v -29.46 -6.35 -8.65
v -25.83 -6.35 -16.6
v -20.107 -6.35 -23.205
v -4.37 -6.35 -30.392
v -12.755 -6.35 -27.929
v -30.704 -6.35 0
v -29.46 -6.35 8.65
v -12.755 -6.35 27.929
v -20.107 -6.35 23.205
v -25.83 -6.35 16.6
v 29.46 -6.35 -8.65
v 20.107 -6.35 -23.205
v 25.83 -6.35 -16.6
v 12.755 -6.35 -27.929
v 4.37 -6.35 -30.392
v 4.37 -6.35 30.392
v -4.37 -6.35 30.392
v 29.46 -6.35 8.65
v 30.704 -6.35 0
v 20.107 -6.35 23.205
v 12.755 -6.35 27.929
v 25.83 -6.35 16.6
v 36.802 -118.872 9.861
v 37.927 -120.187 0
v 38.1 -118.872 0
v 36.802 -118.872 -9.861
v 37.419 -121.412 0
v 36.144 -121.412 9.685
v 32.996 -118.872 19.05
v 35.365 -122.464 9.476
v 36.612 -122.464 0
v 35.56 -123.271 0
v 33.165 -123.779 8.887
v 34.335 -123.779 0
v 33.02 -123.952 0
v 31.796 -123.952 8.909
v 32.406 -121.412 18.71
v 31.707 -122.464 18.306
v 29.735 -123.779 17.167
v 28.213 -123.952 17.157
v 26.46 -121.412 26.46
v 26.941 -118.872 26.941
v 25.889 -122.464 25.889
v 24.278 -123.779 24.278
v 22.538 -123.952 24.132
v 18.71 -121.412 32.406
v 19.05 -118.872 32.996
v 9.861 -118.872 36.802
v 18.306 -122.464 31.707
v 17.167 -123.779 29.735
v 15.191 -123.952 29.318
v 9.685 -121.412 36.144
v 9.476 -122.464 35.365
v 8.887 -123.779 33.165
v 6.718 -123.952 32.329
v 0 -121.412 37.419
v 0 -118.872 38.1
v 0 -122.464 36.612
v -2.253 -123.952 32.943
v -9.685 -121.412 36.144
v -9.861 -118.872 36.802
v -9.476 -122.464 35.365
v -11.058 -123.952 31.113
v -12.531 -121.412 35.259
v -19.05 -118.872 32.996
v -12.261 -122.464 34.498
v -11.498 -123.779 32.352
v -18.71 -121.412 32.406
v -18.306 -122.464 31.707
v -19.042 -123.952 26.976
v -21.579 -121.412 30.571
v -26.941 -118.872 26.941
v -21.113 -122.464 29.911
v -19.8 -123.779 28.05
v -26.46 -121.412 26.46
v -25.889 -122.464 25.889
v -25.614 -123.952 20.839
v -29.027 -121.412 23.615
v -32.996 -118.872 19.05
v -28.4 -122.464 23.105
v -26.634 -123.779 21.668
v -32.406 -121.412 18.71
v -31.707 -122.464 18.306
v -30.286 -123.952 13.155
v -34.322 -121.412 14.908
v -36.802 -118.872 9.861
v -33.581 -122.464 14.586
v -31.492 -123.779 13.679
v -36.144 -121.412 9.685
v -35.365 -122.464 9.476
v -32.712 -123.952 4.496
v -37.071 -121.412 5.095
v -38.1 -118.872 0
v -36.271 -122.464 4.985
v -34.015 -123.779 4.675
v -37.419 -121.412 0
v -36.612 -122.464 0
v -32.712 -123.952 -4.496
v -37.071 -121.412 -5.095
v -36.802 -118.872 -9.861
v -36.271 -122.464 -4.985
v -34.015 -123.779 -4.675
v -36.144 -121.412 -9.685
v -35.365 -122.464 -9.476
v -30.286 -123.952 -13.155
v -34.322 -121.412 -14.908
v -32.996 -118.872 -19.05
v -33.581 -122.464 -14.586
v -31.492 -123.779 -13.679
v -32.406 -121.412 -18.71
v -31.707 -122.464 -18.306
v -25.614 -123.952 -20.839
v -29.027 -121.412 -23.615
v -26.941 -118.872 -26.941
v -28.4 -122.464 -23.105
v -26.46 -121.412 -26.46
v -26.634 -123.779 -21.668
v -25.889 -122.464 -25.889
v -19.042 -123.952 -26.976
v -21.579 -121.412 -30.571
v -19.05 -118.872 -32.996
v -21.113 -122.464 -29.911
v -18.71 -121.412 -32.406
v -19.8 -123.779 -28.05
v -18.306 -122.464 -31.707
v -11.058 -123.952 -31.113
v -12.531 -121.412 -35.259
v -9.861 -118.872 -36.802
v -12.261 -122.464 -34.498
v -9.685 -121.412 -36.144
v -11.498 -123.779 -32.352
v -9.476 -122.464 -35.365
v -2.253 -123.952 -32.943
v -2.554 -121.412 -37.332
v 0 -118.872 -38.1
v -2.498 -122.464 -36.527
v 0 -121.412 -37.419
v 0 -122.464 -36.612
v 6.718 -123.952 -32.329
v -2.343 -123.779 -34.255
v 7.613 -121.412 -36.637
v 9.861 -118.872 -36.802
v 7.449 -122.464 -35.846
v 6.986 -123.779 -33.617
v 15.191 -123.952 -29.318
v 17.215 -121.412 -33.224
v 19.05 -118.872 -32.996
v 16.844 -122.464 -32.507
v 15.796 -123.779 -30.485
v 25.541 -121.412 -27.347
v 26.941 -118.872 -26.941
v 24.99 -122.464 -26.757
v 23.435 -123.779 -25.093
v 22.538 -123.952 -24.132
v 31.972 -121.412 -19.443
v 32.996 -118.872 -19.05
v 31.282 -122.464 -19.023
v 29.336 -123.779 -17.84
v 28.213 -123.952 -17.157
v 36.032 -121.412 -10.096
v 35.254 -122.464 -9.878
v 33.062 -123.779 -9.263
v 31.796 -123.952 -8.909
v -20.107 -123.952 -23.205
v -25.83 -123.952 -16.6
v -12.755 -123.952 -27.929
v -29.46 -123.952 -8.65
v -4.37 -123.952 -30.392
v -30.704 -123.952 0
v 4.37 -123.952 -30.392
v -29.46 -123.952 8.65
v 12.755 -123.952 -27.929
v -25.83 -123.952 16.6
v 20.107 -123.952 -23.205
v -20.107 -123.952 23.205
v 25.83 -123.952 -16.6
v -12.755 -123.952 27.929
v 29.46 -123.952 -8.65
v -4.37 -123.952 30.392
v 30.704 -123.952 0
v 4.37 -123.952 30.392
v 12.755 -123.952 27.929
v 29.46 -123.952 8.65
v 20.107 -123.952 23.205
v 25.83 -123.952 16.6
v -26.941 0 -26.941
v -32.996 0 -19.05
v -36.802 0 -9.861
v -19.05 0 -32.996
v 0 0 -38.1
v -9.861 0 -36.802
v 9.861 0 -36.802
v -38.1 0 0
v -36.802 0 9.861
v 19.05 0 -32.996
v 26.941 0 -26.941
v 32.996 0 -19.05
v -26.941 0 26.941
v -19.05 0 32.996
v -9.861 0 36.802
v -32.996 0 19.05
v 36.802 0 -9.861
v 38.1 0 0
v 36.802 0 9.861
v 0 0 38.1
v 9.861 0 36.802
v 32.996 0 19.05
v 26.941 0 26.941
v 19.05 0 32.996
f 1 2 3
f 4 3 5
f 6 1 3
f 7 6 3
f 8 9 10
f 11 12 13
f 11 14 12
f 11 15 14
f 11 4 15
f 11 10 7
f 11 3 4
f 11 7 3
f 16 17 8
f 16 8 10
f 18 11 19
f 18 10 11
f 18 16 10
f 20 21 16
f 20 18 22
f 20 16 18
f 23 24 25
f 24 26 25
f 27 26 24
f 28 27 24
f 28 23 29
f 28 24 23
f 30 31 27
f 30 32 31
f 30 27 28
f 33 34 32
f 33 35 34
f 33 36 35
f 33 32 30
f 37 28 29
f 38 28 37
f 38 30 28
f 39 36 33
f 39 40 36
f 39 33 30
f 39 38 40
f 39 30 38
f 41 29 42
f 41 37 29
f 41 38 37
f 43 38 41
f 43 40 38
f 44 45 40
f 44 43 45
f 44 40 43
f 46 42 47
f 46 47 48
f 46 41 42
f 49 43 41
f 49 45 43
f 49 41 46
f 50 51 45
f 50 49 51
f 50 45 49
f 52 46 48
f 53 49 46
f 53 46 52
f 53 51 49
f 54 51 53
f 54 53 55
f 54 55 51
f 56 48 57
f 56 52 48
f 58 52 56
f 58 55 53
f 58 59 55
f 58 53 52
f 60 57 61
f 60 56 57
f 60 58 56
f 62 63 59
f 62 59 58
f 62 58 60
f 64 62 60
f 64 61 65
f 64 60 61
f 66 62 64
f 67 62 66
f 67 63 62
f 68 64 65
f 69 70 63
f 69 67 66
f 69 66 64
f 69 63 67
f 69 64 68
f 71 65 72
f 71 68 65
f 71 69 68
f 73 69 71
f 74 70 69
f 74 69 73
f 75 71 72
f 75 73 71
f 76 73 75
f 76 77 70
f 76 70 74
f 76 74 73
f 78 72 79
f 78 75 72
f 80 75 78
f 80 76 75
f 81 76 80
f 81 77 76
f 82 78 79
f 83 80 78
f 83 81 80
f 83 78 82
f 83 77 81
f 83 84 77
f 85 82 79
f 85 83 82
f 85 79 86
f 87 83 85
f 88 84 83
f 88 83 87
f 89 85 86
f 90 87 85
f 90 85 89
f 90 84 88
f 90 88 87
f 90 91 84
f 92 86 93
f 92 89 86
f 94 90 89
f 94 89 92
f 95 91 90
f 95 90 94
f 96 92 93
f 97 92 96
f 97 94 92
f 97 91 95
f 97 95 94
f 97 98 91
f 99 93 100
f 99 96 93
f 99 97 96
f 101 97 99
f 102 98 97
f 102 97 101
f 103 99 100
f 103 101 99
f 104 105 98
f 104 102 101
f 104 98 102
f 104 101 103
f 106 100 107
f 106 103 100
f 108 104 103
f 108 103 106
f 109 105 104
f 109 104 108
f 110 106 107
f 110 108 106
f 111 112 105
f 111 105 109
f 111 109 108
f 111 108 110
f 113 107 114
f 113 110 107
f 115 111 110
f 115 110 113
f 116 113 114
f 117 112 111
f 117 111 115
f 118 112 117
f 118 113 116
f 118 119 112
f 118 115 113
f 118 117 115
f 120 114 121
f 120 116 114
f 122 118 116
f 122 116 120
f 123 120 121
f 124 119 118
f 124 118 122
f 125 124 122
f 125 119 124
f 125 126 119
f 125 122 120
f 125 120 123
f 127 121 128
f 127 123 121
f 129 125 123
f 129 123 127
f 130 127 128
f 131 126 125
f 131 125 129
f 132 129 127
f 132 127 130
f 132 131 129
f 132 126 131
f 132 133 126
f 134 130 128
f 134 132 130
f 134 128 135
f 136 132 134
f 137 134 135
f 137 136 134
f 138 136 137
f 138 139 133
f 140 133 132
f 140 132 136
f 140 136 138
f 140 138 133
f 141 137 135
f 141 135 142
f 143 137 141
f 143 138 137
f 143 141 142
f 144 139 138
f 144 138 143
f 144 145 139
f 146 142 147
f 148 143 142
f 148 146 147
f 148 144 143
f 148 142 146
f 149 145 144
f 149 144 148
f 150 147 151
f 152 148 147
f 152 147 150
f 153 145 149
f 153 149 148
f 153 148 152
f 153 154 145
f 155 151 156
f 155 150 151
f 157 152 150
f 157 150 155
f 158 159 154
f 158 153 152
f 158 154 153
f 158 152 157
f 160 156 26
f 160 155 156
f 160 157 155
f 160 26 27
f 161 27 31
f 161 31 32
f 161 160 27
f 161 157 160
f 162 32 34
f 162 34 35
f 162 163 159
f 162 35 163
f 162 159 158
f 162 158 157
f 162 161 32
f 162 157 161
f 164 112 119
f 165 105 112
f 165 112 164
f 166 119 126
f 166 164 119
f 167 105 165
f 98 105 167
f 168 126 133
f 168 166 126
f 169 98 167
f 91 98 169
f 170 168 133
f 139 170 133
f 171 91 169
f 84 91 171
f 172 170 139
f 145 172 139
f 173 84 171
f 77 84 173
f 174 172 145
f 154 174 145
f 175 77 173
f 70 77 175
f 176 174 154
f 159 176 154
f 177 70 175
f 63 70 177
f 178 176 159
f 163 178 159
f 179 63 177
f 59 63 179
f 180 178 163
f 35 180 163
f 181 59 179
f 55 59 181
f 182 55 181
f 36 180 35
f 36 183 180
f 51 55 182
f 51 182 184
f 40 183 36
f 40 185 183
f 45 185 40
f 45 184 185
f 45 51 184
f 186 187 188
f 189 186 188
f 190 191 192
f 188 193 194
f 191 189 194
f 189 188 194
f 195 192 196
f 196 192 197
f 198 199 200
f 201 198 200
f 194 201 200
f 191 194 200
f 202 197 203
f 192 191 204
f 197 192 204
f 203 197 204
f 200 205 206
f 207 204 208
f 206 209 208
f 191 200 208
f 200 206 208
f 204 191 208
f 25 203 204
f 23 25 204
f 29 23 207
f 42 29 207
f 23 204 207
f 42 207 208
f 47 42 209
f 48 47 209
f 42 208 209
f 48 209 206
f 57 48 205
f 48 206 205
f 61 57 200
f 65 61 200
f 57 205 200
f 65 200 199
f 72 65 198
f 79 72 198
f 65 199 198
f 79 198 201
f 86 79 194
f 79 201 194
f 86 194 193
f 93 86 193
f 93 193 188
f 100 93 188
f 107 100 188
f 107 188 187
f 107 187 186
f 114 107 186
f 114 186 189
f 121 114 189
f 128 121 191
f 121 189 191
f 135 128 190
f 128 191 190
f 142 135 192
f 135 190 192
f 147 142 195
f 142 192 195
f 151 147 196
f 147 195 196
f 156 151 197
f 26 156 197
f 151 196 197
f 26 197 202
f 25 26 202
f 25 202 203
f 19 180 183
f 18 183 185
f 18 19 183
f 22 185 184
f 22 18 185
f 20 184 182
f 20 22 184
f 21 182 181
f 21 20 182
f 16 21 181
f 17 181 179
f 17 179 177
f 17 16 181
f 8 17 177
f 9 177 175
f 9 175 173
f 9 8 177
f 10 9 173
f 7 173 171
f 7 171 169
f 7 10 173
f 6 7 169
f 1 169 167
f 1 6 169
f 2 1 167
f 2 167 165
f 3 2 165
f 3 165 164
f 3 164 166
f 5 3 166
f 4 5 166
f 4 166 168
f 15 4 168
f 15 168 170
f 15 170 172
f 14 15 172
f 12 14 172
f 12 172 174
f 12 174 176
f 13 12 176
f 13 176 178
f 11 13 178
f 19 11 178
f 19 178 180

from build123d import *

# Parameters (mm, degrees)
F0_R     = 38.1
F0_R_2   = 30.704041
F1_DEPTH = 123.952
F2_R     = 5.08
F3_R     = 30.737392
F4_DEPTH = 6.35


with BuildPart() as f1:
    # F0 (on Front) → F1 (new body)
    with BuildSketch(Plane.XZ):
        Circle(F0_R)
        Circle(F0_R_2, mode=Mode.SUBTRACT)
    extrude(amount=F1_DEPTH)

    # F2
    f2_edges = [f1.edges().sort_by_distance(p)[0] for p in [
        (-38.1, -123.952, 0),
    ]]
    fillet(f2_edges, radius=F2_R)

    # F3 (on Front) → F4 (join)
    with BuildSketch(Plane.XZ):
        Circle(F3_R)
    extrude(amount=F4_DEPTH)


solid = f1.part
